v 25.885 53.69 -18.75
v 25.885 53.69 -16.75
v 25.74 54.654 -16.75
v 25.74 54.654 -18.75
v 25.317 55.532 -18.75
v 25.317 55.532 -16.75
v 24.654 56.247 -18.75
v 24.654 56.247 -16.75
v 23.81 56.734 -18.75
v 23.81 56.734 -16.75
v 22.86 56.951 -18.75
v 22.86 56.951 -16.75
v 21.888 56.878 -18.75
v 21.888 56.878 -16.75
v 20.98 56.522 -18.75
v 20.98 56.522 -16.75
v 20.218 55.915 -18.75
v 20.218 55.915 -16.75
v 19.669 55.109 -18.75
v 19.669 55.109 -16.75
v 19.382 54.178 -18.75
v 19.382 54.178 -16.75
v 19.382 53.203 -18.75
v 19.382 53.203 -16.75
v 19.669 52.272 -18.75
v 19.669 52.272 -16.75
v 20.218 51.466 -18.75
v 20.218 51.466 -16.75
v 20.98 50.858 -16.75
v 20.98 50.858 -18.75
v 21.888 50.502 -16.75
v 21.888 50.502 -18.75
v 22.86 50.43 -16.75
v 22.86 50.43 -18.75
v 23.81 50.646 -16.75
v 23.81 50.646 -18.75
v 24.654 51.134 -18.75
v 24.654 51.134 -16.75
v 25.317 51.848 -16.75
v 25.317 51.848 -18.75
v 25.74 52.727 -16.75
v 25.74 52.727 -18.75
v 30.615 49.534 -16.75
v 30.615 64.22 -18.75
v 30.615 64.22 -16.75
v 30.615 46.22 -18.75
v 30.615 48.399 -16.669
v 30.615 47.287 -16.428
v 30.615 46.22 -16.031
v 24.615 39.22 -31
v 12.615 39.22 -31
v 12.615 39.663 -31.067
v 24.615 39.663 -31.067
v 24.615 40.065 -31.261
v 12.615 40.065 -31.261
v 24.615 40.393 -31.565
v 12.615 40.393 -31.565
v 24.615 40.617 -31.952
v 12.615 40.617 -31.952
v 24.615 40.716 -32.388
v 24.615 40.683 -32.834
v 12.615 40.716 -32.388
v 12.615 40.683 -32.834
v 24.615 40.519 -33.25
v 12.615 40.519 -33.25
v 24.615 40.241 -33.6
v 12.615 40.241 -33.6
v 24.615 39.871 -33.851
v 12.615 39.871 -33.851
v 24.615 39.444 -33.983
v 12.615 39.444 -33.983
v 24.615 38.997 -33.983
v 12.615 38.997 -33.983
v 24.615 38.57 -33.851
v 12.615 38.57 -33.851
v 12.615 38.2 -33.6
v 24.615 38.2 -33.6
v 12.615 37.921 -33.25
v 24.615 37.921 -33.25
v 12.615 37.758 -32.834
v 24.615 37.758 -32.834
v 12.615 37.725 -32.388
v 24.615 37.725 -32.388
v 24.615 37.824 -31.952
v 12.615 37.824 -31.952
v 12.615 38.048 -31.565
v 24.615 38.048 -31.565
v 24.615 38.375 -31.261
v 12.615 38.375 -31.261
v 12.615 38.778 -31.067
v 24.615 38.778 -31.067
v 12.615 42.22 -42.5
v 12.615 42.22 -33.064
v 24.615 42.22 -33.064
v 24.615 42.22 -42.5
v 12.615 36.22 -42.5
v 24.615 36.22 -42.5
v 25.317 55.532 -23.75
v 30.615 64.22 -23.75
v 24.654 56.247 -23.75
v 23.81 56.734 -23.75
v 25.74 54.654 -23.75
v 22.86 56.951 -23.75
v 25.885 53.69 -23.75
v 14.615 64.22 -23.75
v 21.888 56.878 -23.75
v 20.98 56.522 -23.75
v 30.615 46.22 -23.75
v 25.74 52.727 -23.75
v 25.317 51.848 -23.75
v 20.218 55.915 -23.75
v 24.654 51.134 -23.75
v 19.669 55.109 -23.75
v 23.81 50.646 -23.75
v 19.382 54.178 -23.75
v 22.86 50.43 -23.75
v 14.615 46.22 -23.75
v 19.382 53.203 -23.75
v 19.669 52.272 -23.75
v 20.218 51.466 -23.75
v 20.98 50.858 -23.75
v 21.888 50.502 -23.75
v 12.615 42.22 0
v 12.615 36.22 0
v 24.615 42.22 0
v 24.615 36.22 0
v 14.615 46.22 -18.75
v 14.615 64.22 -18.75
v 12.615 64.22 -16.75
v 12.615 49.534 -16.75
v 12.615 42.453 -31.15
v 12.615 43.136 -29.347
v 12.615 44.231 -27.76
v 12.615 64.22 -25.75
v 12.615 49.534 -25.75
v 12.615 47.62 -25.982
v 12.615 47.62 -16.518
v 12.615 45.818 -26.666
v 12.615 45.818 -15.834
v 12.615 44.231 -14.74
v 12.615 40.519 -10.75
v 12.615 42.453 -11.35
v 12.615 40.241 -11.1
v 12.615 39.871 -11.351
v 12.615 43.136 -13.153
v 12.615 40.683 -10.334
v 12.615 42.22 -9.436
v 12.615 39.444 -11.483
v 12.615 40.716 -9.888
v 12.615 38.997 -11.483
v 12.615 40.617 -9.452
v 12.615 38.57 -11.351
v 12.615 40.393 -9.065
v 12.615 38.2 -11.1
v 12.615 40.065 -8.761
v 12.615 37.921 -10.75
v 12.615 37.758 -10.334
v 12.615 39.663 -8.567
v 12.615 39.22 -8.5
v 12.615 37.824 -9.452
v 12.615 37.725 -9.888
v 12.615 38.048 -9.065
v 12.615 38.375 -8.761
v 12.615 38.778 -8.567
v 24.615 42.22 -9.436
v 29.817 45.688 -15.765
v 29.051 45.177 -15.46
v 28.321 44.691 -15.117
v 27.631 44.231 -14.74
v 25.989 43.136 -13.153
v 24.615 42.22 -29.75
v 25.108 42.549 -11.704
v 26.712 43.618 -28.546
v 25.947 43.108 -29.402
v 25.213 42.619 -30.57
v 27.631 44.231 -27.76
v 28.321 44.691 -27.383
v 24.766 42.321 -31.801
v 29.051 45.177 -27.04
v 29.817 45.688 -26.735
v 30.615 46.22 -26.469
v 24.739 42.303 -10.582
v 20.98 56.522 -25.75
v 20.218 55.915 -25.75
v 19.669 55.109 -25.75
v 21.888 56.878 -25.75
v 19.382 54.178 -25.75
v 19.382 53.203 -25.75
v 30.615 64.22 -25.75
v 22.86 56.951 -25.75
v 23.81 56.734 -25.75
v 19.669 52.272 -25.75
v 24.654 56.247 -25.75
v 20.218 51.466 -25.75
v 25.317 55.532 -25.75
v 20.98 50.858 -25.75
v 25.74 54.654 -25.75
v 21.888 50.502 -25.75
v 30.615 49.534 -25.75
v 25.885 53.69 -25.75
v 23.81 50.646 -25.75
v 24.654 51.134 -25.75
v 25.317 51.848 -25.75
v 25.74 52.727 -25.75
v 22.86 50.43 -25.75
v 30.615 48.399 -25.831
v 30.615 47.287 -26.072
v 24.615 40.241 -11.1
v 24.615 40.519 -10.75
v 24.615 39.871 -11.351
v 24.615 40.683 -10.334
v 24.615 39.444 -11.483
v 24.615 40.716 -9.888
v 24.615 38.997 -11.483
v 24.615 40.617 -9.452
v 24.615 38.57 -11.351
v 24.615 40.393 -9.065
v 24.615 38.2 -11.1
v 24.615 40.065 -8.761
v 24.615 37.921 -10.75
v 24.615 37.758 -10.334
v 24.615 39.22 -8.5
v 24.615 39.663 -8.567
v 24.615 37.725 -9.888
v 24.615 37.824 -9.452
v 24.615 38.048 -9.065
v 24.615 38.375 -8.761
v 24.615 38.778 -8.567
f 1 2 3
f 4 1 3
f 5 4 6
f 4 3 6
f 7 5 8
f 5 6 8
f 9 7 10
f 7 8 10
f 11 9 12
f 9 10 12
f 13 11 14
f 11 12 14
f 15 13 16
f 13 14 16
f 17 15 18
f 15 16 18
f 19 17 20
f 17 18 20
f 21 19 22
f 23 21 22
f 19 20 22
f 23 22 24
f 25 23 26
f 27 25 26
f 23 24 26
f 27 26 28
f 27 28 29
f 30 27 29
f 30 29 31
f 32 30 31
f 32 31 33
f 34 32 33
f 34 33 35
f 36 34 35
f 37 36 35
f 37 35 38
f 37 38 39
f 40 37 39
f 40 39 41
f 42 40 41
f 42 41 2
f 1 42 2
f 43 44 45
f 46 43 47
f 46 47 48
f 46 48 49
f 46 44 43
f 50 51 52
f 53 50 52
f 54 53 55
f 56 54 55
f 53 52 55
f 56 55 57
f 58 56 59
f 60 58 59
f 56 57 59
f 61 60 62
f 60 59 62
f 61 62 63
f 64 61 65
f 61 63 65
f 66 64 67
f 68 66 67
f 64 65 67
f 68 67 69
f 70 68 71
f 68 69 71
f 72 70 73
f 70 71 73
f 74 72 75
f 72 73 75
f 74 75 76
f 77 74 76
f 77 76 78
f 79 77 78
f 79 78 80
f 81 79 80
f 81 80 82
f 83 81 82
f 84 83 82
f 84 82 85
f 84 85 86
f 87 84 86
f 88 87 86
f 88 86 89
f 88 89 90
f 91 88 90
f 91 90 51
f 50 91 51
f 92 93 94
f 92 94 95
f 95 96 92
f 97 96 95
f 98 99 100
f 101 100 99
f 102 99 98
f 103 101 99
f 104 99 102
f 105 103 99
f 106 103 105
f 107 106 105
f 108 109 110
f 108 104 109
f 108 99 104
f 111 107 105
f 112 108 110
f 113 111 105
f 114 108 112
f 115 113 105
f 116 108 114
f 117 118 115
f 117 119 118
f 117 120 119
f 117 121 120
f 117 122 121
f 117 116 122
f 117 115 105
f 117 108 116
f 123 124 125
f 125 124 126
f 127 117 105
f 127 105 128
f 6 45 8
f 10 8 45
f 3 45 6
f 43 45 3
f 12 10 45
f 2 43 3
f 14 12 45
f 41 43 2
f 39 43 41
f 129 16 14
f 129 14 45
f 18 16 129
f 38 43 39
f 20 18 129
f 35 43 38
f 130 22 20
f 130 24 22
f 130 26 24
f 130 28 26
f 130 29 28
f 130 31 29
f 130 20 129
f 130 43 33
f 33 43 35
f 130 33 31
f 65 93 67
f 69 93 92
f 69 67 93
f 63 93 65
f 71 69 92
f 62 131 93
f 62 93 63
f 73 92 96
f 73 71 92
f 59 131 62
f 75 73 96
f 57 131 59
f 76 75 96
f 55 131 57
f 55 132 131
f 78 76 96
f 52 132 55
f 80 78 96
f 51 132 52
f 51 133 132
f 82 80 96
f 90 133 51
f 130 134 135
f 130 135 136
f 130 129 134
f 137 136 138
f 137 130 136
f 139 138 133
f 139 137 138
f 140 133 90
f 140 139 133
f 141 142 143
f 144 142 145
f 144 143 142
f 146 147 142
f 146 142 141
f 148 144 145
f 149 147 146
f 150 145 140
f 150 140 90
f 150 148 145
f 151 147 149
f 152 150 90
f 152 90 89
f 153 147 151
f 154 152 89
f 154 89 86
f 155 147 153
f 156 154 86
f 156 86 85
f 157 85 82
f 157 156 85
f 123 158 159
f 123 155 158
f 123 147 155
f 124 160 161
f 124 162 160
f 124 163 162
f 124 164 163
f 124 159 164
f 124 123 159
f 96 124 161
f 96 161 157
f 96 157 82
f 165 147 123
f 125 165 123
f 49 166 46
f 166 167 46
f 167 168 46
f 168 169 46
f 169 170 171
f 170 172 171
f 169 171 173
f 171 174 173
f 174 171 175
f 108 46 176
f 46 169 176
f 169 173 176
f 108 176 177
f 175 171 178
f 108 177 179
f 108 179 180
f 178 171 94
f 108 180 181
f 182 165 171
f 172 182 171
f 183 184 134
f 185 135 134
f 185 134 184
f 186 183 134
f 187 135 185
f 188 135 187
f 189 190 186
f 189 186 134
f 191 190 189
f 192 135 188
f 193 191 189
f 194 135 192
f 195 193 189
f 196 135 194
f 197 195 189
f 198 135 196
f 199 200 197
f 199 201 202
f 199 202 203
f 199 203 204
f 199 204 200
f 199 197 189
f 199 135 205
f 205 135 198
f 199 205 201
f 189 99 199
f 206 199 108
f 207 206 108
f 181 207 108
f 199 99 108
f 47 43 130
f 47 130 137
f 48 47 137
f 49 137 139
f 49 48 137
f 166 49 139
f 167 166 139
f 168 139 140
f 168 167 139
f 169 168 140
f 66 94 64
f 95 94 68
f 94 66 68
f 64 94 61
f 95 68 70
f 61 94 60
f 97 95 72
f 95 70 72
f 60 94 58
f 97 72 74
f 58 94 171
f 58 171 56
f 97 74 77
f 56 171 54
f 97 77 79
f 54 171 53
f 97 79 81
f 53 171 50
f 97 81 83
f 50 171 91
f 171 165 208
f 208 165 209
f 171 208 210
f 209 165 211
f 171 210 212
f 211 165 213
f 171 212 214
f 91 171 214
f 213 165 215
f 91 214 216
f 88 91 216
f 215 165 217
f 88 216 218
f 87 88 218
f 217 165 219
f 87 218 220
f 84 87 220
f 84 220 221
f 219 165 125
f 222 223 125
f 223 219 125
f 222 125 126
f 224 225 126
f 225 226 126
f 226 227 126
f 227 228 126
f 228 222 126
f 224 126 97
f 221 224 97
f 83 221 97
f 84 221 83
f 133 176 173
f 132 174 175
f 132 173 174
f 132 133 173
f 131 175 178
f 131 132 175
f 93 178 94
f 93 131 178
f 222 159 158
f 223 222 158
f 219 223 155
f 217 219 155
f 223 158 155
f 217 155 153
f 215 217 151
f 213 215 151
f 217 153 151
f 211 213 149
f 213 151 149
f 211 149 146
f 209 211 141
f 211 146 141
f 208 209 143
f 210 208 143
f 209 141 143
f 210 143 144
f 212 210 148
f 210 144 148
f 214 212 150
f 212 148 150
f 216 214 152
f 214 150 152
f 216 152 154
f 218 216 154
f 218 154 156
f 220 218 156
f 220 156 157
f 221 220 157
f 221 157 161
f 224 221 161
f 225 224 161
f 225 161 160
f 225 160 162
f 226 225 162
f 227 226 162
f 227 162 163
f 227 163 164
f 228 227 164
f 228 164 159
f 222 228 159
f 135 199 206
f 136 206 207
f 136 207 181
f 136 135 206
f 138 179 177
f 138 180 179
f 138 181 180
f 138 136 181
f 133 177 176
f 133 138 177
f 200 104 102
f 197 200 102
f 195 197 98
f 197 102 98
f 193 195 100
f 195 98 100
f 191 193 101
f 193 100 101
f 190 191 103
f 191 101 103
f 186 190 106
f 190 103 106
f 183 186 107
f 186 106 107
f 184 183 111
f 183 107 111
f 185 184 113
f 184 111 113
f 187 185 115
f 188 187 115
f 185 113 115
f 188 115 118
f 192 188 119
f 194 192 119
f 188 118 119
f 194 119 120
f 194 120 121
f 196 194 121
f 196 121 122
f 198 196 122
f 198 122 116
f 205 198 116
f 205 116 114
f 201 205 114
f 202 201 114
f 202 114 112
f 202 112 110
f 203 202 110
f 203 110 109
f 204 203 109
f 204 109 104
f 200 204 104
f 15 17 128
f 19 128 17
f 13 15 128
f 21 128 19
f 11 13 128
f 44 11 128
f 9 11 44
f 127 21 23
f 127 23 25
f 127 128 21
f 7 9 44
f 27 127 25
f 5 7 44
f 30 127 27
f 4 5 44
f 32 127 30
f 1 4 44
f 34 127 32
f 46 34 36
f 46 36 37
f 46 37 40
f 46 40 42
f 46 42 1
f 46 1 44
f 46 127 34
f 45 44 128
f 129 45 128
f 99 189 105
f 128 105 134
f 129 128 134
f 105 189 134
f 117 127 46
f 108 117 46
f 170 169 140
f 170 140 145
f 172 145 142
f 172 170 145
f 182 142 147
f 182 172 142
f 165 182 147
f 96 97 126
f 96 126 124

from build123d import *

# Parameters (mm, degrees)
BOSS_EXTRU_1_DEPTH           = 42.5
D_GAGEMENT_M31_D             = 3
BOSS_EXTRU_2_DEPTH           = 18
ESQUISSE7_R                  = 3.27
ENL_V_MAT_EXTRU_1_DEPTH      = 80.23684853
ENL_V_MAT_EXTRU_2_DEPTH      = 87.149089751
ENL_V_MAT_EXTRU_3_DEPTH      = 78.939140419
ENL_V_MAT_EXTRU_3_DEPTH_BACK = 78.939140419
CONG_4_R                     = 8


with BuildPart() as part:
    # Esquisse1 → Boss.-Extru.1 (new body)
    with BuildSketch(Plane(origin=(0, 0, 0), x_dir=(1, 0, 0), z_dir=(0, 0, -1))):
        Polygon((-1.384510159, -46.220398701), (38.615489841, -46.220398701), (38.615489841, -42.220398701), (24.615489841, -42.220398701), (24.615489841, -36.220398701), (12.615489841, -36.220398701), (12.615489841, -42.220398701), (-1.384510159, -42.220398701), align=None)
    extrude(amount=BOSS_EXTRU_1_DEPTH)

    # Dégagement M31 (through all)
    with Locations(Plane(origin=(24.615489841, 0, 0), x_dir=(0, 0, -1), z_dir=(1, 0, 0))):
        with Locations((10, 39.220398701), (32.5, 39.220398701)):
            Hole(D_GAGEMENT_M31_D / 2)

    # Esquisse6 → Boss.-Extru.2 (add)
    with BuildSketch(Plane(origin=(0, 46.220398701, 0), x_dir=(1, 0, 0), z_dir=(0, 1, 0))):
        Polygon((30.615489841, 23.75), (14.615489841, 23.75), (14.615489841, 18.75), (30.615489841, 18.75), (30.615489841, 16.75), (12.615489841, 16.75), (12.615489841, 25.75), (30.615489841, 25.75), align=None)
    extrude(amount=BOSS_EXTRU_2_DEPTH)

    # Esquisse7 → Enlèv. mat.-Extru.1 (cut, through all)
    with BuildSketch(Plane.XY.offset(-16.75)):
        with Locations((22.615489841, 53.690398701)):
            Circle(ESQUISSE7_R)
    extrude(amount=-ENL_V_MAT_EXTRU_1_DEPTH, mode=Mode.SUBTRACT)

    # Esquisse8 → Enlèv. mat.-Extru.2 (cut, through all)
    with BuildSketch(Plane.XY):
        Polygon((30.615489841, 46.220398701), (24.615489841, 42.220398701), (24.615489841, 36.220398701), (12.615489841, 36.220398701), (12.615489841, 42.220398701), (12.615489841, 46.220398701), (-1.384510159, 46.220398701), (-1.384510159, 34.129389344), (38.615489841, 34.129389344), (38.615489841, 46.220398701), align=None)
    extrude(amount=-ENL_V_MAT_EXTRU_2_DEPTH, mode=Mode.SUBTRACT)

    # Esquisse9 → Enlèv. mat.-Extru.3 (cut, two sides: drawn at the far end of the back side and taken through both)
    with BuildSketch(Plane(origin=(24.615489841, 0, 0), x_dir=(0, 0, -1), z_dir=(1, 0, 0)).offset(-ENL_V_MAT_EXTRU_3_DEPTH_BACK)):
        Polygon((16.75, 46.220398701), (12.75, 42.220398701), (0, 42.220398701), (0, 46.220398701), align=None)
        Polygon((25.75, 46.220398701), (29.75, 42.220398701), (42.5, 42.220398701), (42.5, 46.220398701), align=None)
    extrude(amount=ENL_V_MAT_EXTRU_3_DEPTH + ENL_V_MAT_EXTRU_3_DEPTH_BACK, mode=Mode.SUBTRACT)

    # Congé4
    # the kernel refuses this fillet: 8 mm, written as the material it adds along each edge
    with BuildSketch(Plane(origin=(32.899761088, 42.220398701, -12.75), x_dir=(0, 0.7071067811865437, -0.7071067811865512), z_dir=(-1, 0, 0))) as cong_4_piece_1_section:
        with BuildLine():
            CenterArc((CONG_4_R * 0.414213562373, -CONG_4_R), CONG_4_R, 90, 45)
            Line((-CONG_4_R * 0.292893218813, -CONG_4_R * 0.292893218813), (0, 0))
            Line((0, 0), (CONG_4_R * 0.414213562373, 0))
        make_face()
    cong_4_piece_1 = extrude(amount=20.284271247, mode=Mode.PRIVATE)
    cong_4_piece_1 = split(cong_4_piece_1, bisect_by=Plane(origin=(25.761131429, 42.984159759, -13.773553438), z_dir=(-0.5547001962252294, 0.8320502943378435, 0)), keep=Keep.TOP, mode=Mode.PRIVATE)
    cong_4_piece_1 = split(cong_4_piece_1, bisect_by=Plane(origin=(24.615489841, 43.38850385, -13.773553438), z_dir=(1, 0, 0)), keep=Keep.TOP, mode=Mode.PRIVATE)
    add(cong_4_piece_1)
    with BuildSketch(Plane(origin=(24.615489841, 42.220398701, -12.75), x_dir=(0, 0.7071067811865432, -0.7071067811865518), z_dir=(-1, 0, 0))) as cong_4_piece_2_section:
        with BuildLine():
            CenterArc((CONG_4_R * 0.414213562373, -CONG_4_R), CONG_4_R, 90, 45)
            Line((-CONG_4_R * 0.292893218813, -CONG_4_R * 0.292893218813), (0, 0))
            Line((0, 0), (CONG_4_R * 0.414213562373, 0))
        make_face()
    cong_4_piece_2 = extrude(amount=12, mode=Mode.PRIVATE)
    cong_4_piece_2 = split(cong_4_piece_2, bisect_by=Plane(origin=(20.681270928, 39.597586092, -12.548310033), z_dir=(-0.5547001962252294, 0.8320502943378435, 0)), keep=Keep.TOP, mode=Mode.PRIVATE)
    add(cong_4_piece_2)
    with BuildSketch(Plane(origin=(30.615489841, 46.220398701, -16.75), x_dir=(0, 1, 0), z_dir=(-1, 0, 0))) as cong_4_piece_3_section:
        with BuildLine():
            CenterArc((CONG_4_R * 0.414213562373, -CONG_4_R), CONG_4_R, 90, 45)
            Line((-CONG_4_R * 0.292893218813, -CONG_4_R * 0.292893218813), (0, 0))
            Line((0, 0), (CONG_4_R * 0.414213562373, 0))
        make_face()
    cong_4_piece_3 = extrude(amount=18, mode=Mode.PRIVATE)
    cong_4_piece_3 = split(cong_4_piece_3, bisect_by=Plane(origin=(24.307561612, 42.015113215, -16.286257704), z_dir=(-0.5547001962252294, 0.8320502943378435, 0)), keep=Keep.TOP, mode=Mode.PRIVATE)
    add(cong_4_piece_3)
    with BuildSketch(Plane(origin=(12.615489841, 46.220398701, -25.75), x_dir=(0, 1, 0), z_dir=(1, 0, 0))) as cong_4_piece_4_section:
        with BuildLine():
            CenterArc((CONG_4_R * 0.414213562373, -CONG_4_R), CONG_4_R, 90, 45)
            Line((-CONG_4_R * 0.292893218813, -CONG_4_R * 0.292893218813), (0, 0))
            Line((0, 0), (CONG_4_R * 0.414213562373, 0))
        make_face()
    cong_4_piece_4 = extrude(amount=18, mode=Mode.PRIVATE)
    cong_4_piece_4 = split(cong_4_piece_4, bisect_by=Plane(origin=(24.307561612, 42.015113215, -26.213742296), z_dir=(-0.5547001962252294, 0.8320502943378435, 0)), keep=Keep.TOP, mode=Mode.PRIVATE)
    add(cong_4_piece_4)
    with BuildSketch(Plane(origin=(12.615489841, 42.220398701, -29.75), x_dir=(0, 0.7071067811865519, 0.7071067811865432), z_dir=(1, 0, 0))) as cong_4_piece_5_section:
        with BuildLine():
            CenterArc((CONG_4_R * 0.414213562373, -CONG_4_R), CONG_4_R, 90, 45)
            Line((-CONG_4_R * 0.292893218813, -CONG_4_R * 0.292893218813), (0, 0))
            Line((0, 0), (CONG_4_R * 0.414213562373, 0))
        make_face()
    cong_4_piece_5 = extrude(amount=12, mode=Mode.PRIVATE)
    cong_4_piece_5 = split(cong_4_piece_5, bisect_by=Plane(origin=(20.681270928, 39.597586092, -29.951689967), z_dir=(-0.5547001962252294, 0.8320502943378435, 0)), keep=Keep.TOP, mode=Mode.PRIVATE)
    add(cong_4_piece_5)
    with BuildSketch(Plane(origin=(12.615489841, 42.220398701, -29.75), x_dir=(0, 0.7071067811865519, 0.7071067811865432), z_dir=(1, 0, 0))) as cong_4_piece_6_section:
        with BuildLine():
            CenterArc((CONG_4_R * 0.414213562373, -CONG_4_R), CONG_4_R, 90, 45)
            Line((-CONG_4_R * 0.292893218813, -CONG_4_R * 0.292893218813), (0, 0))
            Line((0, 0), (CONG_4_R * 0.414213562373, 0))
        make_face()
    cong_4_piece_6 = extrude(amount=20.284271247, mode=Mode.PRIVATE)
    cong_4_piece_6 = split(cong_4_piece_6, bisect_by=Plane(origin=(25.761131429, 42.984159759, -28.726446562), z_dir=(-0.5547001962252294, 0.8320502943378435, 0)), keep=Keep.TOP, mode=Mode.PRIVATE)
    cong_4_piece_6 = split(cong_4_piece_6, bisect_by=Plane(origin=(24.615489841, 43.38850385, -28.726446562), z_dir=(1, 0, 0)), keep=Keep.TOP, mode=Mode.PRIVATE)
    add(cong_4_piece_6)


solid = part.part
